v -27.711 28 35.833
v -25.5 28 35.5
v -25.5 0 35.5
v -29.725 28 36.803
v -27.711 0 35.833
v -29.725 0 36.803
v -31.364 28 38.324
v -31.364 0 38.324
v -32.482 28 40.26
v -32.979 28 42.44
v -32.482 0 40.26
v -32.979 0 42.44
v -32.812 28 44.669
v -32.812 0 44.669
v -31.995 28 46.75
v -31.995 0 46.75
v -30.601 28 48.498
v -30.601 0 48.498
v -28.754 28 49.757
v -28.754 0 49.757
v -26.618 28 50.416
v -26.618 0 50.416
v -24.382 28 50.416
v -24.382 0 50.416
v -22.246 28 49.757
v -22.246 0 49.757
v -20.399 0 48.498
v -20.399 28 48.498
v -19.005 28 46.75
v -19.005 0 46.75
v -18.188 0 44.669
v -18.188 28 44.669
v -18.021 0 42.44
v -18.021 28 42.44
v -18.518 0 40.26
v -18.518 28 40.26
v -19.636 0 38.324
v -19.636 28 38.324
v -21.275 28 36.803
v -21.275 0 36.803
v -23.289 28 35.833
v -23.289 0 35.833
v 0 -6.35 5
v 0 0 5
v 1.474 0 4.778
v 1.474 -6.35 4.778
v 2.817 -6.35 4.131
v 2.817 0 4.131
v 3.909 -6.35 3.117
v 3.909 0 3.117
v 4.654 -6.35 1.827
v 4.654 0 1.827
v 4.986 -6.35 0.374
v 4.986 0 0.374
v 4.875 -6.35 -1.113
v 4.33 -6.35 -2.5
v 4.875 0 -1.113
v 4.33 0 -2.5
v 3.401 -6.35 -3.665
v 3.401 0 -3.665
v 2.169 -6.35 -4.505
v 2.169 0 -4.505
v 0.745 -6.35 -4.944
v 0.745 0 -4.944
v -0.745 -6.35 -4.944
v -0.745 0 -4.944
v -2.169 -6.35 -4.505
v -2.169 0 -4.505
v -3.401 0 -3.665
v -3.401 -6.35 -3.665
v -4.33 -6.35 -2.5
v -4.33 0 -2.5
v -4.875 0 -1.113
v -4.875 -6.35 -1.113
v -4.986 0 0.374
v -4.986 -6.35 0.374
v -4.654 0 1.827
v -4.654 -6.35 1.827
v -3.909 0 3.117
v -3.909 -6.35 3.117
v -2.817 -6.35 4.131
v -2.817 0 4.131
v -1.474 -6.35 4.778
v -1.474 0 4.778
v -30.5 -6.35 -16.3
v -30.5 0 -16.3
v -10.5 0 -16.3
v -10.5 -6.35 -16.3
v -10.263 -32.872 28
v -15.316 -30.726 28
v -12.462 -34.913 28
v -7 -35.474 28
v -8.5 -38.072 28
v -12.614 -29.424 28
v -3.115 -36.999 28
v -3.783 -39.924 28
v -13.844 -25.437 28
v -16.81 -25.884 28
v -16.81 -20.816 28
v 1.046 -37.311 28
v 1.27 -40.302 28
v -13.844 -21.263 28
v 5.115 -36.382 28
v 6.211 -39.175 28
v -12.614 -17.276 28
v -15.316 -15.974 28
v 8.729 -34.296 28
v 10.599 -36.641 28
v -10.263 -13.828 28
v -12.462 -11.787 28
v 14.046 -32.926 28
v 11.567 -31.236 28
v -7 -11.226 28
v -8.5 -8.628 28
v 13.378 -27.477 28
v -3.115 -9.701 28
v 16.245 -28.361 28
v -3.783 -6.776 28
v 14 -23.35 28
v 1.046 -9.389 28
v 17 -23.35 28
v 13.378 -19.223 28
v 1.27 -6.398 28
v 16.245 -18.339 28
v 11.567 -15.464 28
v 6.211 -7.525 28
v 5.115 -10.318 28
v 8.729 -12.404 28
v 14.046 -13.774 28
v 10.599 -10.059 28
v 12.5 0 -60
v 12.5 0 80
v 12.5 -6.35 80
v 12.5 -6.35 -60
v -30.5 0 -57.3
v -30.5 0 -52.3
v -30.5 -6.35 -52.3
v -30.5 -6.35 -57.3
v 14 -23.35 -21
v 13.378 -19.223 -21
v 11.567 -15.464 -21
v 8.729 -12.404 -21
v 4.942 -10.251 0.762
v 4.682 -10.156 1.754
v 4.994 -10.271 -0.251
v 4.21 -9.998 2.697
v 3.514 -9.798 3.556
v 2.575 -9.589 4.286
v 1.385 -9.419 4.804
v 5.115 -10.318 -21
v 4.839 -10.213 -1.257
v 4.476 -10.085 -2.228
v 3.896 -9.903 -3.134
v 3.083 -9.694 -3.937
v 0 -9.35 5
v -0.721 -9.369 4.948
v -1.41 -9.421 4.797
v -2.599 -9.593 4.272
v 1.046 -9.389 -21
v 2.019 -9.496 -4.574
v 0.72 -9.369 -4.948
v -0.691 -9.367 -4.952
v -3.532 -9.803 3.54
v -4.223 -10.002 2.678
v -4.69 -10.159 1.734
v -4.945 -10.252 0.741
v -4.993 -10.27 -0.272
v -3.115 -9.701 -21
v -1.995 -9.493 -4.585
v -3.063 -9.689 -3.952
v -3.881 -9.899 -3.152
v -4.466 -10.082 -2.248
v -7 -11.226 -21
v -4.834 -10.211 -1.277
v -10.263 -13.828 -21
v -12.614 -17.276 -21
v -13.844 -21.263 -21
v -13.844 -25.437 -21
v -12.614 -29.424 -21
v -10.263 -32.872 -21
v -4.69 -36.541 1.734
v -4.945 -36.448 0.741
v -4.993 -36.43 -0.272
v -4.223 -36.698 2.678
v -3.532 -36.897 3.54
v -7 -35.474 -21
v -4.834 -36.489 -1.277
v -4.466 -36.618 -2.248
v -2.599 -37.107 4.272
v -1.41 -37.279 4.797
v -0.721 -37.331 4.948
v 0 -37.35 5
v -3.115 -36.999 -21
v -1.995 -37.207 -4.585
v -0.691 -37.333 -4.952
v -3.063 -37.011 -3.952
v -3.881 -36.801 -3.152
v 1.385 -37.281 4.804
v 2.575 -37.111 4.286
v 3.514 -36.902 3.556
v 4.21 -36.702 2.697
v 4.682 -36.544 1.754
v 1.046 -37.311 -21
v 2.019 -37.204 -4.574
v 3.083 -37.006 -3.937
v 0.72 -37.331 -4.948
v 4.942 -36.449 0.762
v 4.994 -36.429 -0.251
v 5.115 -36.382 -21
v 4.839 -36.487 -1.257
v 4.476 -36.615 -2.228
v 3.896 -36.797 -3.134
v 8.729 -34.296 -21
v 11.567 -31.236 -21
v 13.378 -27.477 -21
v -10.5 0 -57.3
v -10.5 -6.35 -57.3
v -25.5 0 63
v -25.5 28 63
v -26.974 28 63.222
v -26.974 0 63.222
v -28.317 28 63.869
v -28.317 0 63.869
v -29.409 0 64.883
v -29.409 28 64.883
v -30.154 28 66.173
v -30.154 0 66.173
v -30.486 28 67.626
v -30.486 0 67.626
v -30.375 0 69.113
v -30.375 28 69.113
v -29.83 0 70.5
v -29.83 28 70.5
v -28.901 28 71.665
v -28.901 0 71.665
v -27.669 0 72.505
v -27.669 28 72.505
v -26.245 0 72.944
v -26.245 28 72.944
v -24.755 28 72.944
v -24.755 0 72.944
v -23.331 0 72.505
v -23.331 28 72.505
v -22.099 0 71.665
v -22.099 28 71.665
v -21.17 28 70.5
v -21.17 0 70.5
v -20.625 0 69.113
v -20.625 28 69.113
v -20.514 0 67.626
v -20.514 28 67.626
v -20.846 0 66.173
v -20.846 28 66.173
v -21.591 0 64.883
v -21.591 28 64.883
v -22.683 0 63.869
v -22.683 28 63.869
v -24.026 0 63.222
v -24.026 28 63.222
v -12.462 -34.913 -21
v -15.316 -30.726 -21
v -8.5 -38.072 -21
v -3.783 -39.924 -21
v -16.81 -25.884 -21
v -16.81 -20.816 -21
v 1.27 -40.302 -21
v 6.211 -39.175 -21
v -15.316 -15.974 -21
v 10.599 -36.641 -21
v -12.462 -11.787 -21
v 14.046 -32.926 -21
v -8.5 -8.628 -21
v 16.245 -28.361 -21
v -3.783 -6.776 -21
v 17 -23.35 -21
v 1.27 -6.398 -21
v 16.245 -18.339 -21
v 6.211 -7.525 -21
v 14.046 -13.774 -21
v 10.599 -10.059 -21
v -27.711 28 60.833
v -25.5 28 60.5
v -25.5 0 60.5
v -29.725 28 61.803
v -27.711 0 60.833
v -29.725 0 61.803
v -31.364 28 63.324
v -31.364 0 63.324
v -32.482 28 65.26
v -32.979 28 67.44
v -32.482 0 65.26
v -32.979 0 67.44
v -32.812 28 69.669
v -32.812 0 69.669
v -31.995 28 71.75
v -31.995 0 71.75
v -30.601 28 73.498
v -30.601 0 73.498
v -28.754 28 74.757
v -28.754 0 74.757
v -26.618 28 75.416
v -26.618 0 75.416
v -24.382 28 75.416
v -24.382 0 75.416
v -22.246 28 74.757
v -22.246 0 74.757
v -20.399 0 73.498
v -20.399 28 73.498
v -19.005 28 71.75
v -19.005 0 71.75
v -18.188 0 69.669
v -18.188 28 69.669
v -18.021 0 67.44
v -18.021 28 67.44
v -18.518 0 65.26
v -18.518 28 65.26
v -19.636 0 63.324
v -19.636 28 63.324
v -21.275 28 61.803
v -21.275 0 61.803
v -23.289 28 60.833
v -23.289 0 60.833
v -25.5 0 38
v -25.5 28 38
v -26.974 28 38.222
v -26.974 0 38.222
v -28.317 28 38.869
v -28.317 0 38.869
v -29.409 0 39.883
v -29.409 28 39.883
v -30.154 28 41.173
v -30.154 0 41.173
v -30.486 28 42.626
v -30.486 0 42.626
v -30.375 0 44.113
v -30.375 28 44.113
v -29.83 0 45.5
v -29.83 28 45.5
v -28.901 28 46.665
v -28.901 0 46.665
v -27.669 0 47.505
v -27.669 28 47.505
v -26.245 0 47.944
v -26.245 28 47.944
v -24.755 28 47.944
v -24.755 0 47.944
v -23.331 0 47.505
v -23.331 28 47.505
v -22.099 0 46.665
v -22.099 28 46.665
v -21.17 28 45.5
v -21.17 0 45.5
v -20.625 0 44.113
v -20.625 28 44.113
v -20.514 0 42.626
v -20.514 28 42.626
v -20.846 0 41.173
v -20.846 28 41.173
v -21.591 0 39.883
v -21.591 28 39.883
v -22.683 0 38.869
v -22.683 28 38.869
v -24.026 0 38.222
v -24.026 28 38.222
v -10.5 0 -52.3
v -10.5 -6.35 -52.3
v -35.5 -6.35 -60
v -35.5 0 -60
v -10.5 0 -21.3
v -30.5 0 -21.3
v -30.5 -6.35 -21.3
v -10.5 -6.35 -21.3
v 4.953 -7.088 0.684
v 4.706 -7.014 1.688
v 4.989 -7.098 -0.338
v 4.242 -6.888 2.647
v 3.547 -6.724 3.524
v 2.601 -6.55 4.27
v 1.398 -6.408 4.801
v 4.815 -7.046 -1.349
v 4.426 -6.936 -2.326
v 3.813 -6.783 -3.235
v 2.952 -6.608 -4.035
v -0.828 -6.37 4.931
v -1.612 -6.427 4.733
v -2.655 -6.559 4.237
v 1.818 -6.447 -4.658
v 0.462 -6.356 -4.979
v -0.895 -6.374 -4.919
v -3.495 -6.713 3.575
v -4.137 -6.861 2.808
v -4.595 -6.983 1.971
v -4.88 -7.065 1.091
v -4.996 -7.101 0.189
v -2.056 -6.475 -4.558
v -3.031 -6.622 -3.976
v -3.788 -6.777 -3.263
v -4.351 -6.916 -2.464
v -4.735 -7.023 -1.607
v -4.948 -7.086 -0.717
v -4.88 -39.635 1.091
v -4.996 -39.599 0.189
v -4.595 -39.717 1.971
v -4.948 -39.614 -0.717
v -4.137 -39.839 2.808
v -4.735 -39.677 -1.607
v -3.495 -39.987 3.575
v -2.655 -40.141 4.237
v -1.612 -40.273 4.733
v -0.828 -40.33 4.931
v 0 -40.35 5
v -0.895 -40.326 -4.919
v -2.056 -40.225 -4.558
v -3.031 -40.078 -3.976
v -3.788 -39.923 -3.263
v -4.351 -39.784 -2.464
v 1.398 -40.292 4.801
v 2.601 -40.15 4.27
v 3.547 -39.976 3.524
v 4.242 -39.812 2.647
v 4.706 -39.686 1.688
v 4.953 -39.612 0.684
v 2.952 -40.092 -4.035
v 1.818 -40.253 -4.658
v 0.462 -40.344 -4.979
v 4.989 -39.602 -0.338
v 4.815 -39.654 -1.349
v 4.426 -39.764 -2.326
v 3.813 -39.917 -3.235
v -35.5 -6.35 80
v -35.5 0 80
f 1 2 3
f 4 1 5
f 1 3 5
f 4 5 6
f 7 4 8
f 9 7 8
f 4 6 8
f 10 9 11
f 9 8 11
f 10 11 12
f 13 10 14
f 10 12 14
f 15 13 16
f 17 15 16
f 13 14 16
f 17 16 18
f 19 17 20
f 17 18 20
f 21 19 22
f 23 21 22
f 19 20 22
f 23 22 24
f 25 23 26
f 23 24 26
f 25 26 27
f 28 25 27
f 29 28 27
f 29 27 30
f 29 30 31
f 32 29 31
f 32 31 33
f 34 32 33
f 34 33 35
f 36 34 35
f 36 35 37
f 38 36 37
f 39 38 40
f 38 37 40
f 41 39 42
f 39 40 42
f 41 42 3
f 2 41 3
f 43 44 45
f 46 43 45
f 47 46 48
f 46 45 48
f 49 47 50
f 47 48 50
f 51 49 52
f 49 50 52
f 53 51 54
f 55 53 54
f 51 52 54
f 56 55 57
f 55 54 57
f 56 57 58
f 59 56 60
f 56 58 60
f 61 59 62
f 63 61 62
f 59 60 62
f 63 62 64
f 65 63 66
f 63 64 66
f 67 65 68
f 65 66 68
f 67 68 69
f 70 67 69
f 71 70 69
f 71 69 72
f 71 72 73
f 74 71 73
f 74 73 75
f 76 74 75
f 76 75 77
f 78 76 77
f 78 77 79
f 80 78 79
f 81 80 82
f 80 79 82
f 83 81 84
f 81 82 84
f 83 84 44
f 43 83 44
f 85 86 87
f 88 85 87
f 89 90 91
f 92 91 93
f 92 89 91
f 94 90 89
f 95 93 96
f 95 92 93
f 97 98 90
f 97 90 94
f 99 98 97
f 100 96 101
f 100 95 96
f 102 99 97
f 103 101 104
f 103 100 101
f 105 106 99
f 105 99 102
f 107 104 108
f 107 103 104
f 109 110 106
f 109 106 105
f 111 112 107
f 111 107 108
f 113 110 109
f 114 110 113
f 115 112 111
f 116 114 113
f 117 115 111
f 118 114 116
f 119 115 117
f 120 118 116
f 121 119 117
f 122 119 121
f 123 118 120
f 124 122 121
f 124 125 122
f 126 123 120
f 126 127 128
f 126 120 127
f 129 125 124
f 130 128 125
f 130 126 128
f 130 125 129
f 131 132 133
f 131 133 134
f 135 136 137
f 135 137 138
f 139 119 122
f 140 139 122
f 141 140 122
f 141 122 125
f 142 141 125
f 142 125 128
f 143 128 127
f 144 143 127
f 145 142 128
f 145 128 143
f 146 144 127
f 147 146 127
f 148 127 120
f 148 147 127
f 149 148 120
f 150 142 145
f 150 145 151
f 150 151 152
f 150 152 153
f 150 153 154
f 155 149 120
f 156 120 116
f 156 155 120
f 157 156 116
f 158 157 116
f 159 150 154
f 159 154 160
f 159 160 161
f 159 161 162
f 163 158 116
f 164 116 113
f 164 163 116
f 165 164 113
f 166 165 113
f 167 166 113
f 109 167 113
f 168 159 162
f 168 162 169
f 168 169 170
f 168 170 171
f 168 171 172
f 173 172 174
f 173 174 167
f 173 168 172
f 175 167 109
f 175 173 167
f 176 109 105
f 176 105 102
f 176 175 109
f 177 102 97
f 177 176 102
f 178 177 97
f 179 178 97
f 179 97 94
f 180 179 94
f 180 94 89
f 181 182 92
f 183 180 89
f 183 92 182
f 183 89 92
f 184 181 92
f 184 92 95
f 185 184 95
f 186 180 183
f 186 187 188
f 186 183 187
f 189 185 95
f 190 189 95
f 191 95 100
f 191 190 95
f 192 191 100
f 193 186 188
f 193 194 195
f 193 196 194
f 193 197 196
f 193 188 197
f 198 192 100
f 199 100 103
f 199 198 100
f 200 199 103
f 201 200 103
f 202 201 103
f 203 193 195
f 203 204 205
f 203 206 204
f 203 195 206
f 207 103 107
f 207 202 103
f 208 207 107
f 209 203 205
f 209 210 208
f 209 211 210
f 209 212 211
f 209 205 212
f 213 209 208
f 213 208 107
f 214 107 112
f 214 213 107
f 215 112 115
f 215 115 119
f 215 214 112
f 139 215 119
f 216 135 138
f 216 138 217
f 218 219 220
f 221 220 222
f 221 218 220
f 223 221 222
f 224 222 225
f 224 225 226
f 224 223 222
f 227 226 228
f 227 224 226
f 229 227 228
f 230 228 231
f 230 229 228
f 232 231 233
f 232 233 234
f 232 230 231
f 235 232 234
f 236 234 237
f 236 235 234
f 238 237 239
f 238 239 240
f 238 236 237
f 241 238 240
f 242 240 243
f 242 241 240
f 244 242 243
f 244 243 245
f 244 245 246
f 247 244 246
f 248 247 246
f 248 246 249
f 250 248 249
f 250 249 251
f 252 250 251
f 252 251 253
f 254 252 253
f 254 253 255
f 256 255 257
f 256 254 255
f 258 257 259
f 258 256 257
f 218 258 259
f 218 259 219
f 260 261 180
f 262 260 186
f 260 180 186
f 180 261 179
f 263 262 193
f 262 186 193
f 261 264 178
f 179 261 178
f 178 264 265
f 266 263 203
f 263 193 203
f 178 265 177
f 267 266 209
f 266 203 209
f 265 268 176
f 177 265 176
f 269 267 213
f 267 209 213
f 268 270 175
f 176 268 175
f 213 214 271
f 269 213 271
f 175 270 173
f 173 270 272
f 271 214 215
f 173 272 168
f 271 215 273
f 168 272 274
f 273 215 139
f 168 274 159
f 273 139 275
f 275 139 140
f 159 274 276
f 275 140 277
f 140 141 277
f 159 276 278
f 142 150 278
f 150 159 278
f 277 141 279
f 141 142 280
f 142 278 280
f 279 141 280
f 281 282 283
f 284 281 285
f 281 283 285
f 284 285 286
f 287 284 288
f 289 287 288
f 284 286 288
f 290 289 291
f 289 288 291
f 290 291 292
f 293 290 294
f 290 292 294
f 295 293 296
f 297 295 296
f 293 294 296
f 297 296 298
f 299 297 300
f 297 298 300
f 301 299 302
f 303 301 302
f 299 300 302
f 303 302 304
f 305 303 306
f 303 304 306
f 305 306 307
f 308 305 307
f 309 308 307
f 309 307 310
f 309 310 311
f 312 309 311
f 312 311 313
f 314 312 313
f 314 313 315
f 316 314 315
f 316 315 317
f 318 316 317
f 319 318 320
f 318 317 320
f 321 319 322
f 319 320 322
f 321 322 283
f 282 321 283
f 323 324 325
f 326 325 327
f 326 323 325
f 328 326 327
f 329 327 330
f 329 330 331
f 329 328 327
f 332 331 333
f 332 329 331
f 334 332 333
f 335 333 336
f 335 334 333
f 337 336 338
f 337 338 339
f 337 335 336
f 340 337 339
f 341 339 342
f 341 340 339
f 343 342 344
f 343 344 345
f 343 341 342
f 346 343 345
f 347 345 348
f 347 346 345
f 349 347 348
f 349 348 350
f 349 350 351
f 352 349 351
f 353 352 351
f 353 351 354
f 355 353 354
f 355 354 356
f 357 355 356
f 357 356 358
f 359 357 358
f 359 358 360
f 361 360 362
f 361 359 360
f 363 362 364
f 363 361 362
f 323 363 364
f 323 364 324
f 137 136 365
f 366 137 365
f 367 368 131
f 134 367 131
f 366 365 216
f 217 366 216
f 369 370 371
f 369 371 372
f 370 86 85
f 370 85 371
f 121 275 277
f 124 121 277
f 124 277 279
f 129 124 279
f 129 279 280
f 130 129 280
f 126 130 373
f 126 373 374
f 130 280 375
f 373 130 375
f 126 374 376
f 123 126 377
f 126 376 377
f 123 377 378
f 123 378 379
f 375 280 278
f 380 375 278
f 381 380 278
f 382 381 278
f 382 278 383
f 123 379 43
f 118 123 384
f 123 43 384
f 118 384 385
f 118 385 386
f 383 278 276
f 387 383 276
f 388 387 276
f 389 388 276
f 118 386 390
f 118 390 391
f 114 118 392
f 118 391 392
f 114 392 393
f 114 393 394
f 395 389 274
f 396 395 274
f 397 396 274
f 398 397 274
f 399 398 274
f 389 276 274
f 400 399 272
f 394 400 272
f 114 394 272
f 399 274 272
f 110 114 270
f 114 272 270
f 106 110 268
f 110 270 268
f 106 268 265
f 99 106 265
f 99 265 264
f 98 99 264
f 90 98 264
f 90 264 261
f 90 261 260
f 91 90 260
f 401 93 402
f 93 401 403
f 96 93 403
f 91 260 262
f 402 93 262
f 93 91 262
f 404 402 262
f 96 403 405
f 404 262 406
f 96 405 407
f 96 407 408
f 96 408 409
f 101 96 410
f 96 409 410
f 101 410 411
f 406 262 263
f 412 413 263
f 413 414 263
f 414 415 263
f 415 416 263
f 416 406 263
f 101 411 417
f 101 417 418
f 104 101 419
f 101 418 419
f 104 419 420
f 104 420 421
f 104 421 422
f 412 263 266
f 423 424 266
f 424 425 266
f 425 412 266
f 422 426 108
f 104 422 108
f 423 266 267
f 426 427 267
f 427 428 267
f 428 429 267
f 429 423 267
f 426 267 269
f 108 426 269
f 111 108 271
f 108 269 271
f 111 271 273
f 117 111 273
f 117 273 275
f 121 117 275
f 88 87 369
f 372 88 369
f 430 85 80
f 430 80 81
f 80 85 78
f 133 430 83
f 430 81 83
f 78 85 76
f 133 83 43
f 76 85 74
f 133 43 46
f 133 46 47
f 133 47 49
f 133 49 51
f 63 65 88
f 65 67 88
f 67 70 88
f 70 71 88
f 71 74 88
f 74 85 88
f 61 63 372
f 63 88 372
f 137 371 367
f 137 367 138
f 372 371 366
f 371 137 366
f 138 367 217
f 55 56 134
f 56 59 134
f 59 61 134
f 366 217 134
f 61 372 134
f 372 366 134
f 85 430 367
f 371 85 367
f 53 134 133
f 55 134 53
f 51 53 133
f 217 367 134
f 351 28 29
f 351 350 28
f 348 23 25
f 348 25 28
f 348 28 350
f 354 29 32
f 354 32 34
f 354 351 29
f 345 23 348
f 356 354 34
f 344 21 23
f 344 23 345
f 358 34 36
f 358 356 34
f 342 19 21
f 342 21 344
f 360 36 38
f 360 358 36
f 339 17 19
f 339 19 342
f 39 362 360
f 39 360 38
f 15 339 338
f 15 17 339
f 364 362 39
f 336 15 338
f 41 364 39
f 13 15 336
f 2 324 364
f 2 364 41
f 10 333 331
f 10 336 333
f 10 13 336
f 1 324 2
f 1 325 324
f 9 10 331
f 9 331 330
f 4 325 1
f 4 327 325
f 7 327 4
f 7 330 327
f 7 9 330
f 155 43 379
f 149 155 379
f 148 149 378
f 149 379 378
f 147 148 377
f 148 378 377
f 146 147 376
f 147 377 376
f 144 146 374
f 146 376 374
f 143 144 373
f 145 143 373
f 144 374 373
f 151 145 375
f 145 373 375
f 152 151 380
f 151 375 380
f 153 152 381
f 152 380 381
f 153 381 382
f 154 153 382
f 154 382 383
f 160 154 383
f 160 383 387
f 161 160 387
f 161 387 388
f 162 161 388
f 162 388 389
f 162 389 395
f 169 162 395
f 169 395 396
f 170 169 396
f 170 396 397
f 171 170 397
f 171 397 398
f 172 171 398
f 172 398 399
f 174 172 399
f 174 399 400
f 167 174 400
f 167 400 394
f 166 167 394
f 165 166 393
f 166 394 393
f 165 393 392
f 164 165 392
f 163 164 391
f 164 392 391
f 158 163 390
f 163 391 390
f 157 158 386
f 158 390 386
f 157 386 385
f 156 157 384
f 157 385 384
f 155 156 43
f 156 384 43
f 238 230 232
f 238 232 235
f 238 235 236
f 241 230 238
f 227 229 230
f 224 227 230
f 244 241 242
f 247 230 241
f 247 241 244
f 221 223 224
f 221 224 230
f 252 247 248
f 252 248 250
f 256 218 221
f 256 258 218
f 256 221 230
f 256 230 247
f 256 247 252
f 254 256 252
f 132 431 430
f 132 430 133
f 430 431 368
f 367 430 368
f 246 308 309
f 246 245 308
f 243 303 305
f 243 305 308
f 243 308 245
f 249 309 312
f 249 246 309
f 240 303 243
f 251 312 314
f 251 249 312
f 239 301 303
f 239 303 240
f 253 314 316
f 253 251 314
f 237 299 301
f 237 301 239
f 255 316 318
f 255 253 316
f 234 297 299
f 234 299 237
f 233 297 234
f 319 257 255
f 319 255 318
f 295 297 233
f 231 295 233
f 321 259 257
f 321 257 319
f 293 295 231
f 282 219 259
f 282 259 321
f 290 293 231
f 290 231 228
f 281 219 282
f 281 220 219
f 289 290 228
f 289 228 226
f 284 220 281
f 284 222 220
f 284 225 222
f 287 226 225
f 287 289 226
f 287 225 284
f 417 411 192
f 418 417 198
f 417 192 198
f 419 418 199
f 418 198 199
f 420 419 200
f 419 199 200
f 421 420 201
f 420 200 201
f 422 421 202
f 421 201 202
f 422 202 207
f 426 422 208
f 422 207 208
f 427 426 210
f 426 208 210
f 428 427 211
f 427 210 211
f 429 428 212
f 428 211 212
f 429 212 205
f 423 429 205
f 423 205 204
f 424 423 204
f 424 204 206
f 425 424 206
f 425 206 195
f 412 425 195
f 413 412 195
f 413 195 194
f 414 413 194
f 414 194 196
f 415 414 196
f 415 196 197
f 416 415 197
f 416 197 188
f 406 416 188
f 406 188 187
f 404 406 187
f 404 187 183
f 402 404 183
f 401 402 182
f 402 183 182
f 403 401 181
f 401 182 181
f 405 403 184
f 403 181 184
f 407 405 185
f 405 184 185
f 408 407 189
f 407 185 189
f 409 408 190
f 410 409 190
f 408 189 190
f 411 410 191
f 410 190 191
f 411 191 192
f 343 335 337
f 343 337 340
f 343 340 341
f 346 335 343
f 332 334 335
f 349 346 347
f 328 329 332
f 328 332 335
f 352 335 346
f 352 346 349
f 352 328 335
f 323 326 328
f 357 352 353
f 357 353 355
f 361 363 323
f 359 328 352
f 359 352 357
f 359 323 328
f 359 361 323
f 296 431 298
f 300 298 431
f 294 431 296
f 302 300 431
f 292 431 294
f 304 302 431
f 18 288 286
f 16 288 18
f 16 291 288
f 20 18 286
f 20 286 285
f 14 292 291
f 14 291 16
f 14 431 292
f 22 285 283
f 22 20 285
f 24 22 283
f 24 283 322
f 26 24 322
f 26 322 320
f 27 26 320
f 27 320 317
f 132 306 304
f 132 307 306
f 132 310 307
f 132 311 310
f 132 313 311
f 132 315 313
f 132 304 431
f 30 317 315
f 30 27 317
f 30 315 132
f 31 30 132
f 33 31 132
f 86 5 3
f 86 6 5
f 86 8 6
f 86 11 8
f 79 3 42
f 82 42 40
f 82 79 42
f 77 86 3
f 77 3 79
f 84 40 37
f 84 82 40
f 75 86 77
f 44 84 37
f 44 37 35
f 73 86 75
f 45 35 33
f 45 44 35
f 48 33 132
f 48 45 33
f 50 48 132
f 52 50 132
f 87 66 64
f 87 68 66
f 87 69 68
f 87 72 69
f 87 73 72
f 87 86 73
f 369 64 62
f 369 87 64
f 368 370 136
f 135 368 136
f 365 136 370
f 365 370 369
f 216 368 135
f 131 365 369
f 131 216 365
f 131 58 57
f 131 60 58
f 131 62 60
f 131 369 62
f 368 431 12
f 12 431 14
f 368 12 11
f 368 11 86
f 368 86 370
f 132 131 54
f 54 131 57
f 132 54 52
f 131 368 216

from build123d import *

# Parameters (mm, degrees)
SKETCH1_W                = 48
SKETCH1_H                = 140
SKETCH1_R                = 5
SKETCH1_W_2              = 20
SKETCH1_H_2              = 5
BASE_FLANGE1_DEPTH       = 6.35
SKETCH6_R                = 7.5
SKETCH6_R_2              = 5
BOSS_EXTRUDE1_DEPTH      = 28
BOSS_EXTRUDE2_DEPTH      = 28
BOSS_EXTRUDE2_DEPTH_BACK = 21
SKETCH7_R                = 17
SKETCH7_R_2              = 14
SKETCH8_R                = 5
CUT_EXTRUDE1_DEPTH       = 97.376202976


# Sheet-metal steps are written as plain solids
with BuildPart() as part:
    # Sketch1 → Base-Flange1 (new body)
    with BuildSketch(Plane(origin=(0, 0, 0), x_dir=(1, 0, 0), z_dir=(0, 1, 0))):
        with Locations((-11.5, -10)):
            Rectangle(SKETCH1_W, SKETCH1_H)
        with Locations(Location((0, 0, 0), (0, 0, 270))):
            Circle(SKETCH1_R, mode=Mode.SUBTRACT)
        with Locations((-20.5, 54.8)):
            Rectangle(SKETCH1_W_2, SKETCH1_H_2, mode=Mode.SUBTRACT)
        with Locations((-20.5, 18.8)):
            Rectangle(SKETCH1_W_2, SKETCH1_H_2, mode=Mode.SUBTRACT)
    extrude(amount=-BASE_FLANGE1_DEPTH)

    # Sketch6 → Boss-Extrude1 (add)
    # profile 1 of 2: a face of its own
    with BuildSketch(Plane(origin=(0, 0, 0), x_dir=(1, 0, 0), z_dir=(0, 1, 0))):
        with Locations(Location((-25.5, -68, 0), (0, 0, 90))):
            Circle(SKETCH6_R)
        with Locations(Location((-25.5, -68, 0), (0, 0, 90))):
            Circle(SKETCH6_R_2, mode=Mode.SUBTRACT)
    # profile 2 of 2: a face of its own
    with BuildSketch(Plane(origin=(0, 0, 0), x_dir=(1, 0, 0), z_dir=(0, 1, 0))):
        with Locations(Location((-25.5, -43, 0), (0, 0, 90))):
            Circle(SKETCH6_R)
        with Locations(Location((-25.5, -43, 0), (0, 0, 90))):
            Circle(SKETCH6_R_2, mode=Mode.SUBTRACT)
    extrude(amount=BOSS_EXTRUDE1_DEPTH)


with BuildPart() as body_2:
    # Sketch7 → Boss-Extrude2 (new, two sides: drawn at the far end of the back side and taken through both)
    with BuildSketch(Plane.XY.offset(-BOSS_EXTRUDE2_DEPTH_BACK)):
        with Locations((0, -23.35)):
            Circle(SKETCH7_R)
        with Locations((0, -23.35)):
            Circle(SKETCH7_R_2, mode=Mode.SUBTRACT)
    extrude(amount=BOSS_EXTRUDE2_DEPTH + BOSS_EXTRUDE2_DEPTH_BACK)

    # Sketch8 → Cut-Extrude1 (cut, through all)
    with BuildSketch(Plane(origin=(0, 0, 0), x_dir=(1, 0, 0), z_dir=(0, 1, 0))):
        with Locations(Location((0, 0, 0), (0, 0, 270))):
            Circle(SKETCH8_R)
    extrude(amount=-CUT_EXTRUDE1_DEPTH, mode=Mode.SUBTRACT)


solid = Compound([part.part, body_2.part])
